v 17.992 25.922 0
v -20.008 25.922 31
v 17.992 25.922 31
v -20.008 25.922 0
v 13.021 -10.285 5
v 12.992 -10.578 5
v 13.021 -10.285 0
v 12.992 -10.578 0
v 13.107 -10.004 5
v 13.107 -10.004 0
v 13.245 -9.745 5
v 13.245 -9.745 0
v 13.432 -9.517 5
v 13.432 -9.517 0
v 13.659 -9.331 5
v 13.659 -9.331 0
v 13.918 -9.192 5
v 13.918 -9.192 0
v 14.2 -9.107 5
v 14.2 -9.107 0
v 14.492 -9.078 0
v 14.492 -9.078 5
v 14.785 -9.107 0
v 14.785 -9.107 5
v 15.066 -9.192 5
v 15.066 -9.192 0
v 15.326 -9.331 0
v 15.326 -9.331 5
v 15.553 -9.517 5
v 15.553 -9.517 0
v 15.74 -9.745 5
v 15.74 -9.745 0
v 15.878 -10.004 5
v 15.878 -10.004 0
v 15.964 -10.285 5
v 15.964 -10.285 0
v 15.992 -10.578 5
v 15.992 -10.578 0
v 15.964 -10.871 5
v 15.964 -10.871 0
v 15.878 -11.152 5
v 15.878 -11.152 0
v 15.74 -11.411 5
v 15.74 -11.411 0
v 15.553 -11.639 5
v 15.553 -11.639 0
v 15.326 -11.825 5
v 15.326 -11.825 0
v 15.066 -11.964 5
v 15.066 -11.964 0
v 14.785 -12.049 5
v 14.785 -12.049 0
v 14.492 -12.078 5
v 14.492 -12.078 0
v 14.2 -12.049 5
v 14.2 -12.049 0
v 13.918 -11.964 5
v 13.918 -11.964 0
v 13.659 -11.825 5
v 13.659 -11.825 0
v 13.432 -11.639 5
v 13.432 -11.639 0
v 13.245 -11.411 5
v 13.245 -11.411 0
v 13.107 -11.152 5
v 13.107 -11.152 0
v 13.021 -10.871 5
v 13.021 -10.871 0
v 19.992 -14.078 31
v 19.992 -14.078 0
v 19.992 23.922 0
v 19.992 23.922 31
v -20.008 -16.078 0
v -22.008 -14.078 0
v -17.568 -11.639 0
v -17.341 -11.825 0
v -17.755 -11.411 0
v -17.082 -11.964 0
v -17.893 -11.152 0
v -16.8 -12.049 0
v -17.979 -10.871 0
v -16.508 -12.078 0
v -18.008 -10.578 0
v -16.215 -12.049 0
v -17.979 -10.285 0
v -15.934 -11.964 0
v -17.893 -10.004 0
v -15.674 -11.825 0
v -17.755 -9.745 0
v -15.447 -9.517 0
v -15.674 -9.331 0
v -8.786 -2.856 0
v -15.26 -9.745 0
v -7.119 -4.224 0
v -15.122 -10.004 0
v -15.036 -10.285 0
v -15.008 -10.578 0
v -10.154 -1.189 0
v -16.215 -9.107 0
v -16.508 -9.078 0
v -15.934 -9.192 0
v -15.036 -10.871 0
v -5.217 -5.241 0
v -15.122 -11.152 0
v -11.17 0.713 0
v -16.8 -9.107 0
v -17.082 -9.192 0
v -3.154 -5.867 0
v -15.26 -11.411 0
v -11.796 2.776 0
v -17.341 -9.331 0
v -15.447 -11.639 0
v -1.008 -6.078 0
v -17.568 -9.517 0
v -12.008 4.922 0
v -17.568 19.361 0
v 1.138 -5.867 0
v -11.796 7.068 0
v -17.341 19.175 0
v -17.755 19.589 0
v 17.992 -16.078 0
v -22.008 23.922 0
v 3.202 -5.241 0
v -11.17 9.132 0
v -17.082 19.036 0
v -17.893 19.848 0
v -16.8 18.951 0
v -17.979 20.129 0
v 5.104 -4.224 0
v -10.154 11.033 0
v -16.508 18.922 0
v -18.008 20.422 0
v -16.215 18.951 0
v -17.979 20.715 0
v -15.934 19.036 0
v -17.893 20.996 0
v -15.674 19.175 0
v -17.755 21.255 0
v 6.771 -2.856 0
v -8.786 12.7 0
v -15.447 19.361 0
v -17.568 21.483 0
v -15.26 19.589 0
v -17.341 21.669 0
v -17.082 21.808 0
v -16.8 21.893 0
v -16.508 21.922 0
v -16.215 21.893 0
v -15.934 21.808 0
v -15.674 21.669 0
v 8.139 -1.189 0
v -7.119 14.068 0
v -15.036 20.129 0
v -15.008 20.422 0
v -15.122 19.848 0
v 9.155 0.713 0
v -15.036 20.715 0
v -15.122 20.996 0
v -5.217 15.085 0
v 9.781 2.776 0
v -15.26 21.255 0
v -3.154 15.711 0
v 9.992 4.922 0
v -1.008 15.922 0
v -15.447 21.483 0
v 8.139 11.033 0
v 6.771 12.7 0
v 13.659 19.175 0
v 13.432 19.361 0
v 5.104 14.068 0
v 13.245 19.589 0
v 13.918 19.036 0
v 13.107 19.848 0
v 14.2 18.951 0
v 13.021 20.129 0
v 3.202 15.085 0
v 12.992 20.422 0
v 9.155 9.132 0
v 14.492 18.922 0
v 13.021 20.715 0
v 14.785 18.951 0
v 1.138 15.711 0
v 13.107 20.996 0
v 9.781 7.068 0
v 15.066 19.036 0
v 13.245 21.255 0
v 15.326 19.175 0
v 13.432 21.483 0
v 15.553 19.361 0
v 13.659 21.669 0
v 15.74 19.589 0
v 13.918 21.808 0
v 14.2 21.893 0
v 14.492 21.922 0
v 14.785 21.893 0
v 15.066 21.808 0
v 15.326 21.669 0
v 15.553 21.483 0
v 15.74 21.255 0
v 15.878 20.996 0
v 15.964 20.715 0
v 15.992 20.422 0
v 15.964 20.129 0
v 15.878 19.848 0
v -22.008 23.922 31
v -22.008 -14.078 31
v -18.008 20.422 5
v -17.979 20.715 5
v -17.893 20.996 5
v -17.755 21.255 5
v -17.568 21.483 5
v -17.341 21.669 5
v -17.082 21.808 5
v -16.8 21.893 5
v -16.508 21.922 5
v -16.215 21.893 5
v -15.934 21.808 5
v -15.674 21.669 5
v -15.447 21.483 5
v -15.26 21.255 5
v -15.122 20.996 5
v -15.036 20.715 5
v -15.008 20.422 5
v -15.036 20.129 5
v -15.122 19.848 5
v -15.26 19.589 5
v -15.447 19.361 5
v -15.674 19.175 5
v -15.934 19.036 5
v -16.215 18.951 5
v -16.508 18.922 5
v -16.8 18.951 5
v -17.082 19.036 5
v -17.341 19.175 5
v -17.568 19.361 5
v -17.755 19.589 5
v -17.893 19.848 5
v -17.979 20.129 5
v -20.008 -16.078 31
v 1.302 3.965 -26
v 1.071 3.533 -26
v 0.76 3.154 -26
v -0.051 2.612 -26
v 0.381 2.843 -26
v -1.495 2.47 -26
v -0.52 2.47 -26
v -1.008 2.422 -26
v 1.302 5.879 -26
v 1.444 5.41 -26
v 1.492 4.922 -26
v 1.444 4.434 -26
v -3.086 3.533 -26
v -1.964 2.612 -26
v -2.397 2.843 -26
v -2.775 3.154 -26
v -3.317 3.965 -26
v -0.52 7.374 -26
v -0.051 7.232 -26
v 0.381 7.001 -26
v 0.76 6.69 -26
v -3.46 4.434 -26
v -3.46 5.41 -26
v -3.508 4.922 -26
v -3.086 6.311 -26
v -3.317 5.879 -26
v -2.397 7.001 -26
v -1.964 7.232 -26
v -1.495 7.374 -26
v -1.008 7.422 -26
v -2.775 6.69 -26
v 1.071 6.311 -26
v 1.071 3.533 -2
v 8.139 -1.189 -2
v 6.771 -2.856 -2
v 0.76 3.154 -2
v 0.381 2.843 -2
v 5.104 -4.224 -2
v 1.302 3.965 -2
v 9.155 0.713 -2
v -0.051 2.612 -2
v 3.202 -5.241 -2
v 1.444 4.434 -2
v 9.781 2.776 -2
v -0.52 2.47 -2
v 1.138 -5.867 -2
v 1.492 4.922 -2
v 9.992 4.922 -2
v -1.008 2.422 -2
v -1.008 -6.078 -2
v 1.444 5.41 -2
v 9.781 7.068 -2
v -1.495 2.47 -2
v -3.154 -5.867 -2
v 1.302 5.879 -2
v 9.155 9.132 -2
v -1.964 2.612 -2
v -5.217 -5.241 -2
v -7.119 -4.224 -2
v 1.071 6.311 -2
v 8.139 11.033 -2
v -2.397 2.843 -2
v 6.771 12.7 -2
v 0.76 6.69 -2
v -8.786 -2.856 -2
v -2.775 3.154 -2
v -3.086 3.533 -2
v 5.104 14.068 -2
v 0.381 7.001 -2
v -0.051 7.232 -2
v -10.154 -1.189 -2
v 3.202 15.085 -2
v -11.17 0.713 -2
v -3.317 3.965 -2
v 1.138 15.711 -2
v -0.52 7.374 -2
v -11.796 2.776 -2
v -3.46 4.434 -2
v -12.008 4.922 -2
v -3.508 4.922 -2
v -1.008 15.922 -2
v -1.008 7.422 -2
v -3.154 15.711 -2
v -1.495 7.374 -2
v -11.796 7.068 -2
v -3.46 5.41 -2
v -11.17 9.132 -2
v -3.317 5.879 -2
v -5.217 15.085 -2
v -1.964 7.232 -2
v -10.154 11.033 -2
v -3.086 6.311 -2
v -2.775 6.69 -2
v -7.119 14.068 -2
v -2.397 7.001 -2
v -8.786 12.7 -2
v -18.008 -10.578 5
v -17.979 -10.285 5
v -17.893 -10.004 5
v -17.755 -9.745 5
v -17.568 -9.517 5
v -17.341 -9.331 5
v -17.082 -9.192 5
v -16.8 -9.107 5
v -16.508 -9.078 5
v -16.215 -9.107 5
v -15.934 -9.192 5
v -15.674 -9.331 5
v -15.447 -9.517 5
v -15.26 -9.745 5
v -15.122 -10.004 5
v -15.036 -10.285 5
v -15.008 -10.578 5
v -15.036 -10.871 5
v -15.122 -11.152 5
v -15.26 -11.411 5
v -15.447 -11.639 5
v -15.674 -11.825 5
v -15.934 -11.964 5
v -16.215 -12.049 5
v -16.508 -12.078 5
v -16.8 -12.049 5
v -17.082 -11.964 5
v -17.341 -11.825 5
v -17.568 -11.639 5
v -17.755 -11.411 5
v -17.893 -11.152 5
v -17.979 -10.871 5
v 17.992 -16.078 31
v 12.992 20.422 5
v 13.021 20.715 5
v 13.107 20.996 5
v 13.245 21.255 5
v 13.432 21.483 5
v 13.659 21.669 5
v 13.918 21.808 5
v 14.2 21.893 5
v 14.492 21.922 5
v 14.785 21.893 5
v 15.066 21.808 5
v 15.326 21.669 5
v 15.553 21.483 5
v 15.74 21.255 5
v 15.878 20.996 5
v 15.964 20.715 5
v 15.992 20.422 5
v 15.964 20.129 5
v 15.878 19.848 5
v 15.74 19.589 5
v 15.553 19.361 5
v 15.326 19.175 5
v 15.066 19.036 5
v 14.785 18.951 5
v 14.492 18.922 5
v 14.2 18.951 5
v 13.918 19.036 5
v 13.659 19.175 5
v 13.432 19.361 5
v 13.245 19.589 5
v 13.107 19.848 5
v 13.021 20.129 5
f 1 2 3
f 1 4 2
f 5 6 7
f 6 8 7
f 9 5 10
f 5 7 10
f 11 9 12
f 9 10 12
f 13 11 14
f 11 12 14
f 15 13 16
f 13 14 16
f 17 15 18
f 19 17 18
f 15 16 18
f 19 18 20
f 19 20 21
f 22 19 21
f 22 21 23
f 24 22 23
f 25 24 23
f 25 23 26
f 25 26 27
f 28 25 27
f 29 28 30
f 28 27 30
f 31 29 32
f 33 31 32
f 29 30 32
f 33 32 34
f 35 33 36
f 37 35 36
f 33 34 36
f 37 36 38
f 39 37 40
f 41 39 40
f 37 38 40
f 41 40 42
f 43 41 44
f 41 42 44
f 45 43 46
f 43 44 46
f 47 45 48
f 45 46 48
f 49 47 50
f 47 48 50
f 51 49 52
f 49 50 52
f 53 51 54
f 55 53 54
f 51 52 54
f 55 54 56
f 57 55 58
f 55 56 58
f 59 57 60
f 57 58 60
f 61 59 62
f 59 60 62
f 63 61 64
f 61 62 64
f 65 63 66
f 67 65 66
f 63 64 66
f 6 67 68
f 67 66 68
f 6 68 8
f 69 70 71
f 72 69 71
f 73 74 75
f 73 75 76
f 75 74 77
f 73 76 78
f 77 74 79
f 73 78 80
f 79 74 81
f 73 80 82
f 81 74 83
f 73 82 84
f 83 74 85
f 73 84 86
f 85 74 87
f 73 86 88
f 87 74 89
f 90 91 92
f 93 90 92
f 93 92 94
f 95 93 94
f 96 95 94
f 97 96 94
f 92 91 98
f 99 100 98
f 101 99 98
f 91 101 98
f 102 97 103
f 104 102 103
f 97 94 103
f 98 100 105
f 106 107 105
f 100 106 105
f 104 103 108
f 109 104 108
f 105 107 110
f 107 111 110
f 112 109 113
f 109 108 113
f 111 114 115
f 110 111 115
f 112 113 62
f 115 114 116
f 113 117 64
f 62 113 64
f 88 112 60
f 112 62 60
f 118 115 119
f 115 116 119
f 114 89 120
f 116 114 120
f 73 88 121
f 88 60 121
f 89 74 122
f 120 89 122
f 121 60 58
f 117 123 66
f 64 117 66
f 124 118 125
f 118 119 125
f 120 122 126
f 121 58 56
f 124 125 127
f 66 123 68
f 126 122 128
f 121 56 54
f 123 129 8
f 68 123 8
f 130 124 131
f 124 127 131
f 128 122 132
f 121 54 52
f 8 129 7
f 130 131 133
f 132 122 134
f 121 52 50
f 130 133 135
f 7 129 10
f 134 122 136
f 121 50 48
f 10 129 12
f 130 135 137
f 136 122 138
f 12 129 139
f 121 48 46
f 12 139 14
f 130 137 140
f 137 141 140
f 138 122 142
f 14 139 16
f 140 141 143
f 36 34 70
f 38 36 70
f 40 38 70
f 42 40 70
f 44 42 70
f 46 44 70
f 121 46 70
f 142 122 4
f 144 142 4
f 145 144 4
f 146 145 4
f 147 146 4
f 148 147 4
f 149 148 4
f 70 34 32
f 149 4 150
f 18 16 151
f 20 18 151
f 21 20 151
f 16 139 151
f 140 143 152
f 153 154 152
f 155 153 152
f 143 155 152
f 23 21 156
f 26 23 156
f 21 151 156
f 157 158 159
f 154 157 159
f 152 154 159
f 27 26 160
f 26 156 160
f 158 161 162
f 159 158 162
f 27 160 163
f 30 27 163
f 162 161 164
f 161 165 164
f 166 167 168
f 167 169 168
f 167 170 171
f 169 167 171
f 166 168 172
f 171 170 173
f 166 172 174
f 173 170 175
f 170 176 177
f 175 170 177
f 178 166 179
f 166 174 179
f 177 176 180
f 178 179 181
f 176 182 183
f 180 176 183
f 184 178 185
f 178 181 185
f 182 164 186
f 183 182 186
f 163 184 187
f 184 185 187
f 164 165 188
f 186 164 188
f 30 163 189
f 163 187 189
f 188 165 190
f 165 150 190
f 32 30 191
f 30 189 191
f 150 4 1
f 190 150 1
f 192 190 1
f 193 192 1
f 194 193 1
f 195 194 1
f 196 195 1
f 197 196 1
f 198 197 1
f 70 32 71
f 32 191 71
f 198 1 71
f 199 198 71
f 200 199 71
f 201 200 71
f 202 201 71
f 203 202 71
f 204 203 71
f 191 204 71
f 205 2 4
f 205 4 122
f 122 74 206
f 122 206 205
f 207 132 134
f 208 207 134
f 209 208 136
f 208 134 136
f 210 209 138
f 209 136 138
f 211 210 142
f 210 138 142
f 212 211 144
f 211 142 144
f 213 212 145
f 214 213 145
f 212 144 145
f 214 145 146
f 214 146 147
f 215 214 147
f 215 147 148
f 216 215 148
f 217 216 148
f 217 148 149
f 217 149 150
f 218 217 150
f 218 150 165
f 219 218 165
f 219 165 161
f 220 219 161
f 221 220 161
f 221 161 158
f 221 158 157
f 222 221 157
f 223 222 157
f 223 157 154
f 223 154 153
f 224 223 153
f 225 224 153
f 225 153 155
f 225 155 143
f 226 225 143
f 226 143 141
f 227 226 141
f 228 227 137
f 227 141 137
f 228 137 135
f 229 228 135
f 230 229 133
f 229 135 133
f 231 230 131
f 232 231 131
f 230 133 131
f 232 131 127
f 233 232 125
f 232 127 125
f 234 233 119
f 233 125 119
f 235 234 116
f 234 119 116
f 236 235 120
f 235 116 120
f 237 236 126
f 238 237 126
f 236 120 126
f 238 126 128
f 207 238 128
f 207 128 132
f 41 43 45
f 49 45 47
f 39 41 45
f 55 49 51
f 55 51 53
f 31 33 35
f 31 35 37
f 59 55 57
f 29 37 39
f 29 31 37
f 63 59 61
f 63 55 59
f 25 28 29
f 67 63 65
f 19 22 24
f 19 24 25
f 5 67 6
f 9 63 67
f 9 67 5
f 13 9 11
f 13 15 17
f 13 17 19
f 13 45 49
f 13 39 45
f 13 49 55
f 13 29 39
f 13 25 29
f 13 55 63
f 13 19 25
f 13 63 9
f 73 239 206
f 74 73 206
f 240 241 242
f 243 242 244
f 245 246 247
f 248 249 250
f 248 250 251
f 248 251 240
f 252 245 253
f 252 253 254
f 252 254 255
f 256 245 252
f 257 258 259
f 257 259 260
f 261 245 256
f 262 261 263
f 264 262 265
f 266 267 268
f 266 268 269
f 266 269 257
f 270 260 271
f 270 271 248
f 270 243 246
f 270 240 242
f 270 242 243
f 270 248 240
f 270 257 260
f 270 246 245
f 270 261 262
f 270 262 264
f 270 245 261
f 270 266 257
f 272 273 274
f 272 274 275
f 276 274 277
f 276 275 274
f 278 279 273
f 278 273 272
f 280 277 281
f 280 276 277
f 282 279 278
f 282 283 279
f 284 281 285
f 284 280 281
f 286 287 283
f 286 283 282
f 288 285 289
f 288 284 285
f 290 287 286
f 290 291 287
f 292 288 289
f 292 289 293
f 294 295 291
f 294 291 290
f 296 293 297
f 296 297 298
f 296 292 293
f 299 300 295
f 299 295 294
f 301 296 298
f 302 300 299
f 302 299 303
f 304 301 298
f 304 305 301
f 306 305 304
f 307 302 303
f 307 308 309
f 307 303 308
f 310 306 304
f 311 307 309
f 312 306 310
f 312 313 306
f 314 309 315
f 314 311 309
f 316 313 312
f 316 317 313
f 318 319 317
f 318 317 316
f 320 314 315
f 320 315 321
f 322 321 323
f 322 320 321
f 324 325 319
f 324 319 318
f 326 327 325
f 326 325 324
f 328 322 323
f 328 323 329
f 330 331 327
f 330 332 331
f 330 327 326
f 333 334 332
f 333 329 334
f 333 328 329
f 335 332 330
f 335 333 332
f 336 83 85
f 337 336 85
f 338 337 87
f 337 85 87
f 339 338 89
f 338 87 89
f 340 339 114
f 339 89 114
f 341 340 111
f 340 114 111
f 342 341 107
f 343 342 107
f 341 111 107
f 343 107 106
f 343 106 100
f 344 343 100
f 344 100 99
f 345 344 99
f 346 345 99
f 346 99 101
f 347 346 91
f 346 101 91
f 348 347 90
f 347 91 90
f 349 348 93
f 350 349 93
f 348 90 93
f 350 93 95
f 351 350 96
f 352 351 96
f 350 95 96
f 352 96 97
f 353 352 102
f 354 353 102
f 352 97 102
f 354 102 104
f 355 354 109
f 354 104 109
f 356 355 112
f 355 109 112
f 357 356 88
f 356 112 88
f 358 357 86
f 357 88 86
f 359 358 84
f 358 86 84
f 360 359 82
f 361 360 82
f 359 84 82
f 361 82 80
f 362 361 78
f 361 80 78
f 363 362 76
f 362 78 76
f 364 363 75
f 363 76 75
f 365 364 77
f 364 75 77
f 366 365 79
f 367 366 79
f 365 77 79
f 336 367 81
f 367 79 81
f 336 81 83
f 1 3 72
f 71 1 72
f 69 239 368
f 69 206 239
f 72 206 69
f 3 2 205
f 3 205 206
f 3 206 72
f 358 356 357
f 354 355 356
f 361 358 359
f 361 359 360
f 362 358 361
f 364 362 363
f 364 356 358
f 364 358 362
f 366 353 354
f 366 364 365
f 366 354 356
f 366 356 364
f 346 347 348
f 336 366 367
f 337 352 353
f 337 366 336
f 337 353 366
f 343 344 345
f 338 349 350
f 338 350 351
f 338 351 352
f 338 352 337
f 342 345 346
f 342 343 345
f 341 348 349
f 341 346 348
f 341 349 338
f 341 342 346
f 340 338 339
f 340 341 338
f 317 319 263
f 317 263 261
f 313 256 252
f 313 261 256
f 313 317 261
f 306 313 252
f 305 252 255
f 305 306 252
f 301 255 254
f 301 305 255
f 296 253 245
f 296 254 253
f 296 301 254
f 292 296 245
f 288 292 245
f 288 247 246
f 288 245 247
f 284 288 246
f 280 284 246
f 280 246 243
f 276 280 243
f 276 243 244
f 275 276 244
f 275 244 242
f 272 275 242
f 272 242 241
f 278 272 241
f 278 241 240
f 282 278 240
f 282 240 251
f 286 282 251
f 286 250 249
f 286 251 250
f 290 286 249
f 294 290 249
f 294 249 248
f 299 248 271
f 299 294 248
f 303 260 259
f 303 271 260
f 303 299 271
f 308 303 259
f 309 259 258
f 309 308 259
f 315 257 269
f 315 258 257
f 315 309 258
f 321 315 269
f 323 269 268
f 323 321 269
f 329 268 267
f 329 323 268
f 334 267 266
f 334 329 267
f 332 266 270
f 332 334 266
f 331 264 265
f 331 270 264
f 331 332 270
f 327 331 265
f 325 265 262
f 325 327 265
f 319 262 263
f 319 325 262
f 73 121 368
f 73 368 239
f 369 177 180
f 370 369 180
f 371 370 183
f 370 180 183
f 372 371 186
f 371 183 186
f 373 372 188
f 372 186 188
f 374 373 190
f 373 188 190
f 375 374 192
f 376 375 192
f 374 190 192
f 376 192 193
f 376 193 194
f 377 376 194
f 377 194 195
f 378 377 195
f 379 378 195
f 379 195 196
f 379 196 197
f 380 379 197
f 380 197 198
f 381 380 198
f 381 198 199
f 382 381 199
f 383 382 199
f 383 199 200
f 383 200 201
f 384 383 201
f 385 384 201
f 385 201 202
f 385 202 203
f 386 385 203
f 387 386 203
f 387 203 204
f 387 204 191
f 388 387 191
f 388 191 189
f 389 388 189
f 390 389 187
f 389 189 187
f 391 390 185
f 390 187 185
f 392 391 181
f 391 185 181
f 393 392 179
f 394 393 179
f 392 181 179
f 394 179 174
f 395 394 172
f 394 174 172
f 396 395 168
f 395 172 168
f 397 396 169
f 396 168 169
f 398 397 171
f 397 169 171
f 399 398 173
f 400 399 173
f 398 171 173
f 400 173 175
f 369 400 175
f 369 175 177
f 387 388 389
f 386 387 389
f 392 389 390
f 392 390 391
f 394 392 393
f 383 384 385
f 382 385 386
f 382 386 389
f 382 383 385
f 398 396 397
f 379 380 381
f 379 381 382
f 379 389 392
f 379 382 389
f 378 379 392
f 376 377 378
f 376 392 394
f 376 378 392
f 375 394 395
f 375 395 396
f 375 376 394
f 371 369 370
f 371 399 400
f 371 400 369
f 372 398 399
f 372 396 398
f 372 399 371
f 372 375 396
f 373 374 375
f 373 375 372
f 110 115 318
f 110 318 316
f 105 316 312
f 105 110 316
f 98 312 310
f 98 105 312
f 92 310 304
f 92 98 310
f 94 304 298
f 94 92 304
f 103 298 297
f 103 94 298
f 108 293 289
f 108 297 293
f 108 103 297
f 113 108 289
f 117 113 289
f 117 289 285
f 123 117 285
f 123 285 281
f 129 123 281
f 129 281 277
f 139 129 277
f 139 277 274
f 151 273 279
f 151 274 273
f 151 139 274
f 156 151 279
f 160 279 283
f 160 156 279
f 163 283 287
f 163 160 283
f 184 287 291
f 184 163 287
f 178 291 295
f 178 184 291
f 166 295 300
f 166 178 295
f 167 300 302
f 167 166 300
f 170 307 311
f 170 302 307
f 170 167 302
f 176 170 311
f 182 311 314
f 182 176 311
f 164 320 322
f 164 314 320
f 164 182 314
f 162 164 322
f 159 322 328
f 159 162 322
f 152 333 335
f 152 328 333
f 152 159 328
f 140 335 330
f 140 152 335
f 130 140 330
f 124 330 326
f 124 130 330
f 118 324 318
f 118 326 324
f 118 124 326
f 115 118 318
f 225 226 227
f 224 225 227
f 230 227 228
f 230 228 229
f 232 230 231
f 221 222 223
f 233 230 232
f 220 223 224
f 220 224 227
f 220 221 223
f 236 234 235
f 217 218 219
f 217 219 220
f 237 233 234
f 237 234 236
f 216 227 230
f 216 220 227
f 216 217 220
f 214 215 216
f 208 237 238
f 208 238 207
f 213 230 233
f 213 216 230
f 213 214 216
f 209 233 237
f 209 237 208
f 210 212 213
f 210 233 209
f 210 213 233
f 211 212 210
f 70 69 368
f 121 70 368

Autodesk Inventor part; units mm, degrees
ref_plane "YZ Plane" through (0, 0, 0) normal (1, 0, 0) x (0, 1, 0)
ref_plane "XZ Plane" through (0, 0, 0) normal (0, 1, 0) x (-1, 0, 0)
ref_plane "XY Plane" through (0, 0, 0) normal (0, 0, 1) x (1, 0, 0)
sketch "Sketch1" plane through (0, 0, 0) normal (0, 0, 1) x (1, 0, 0)
  line L0 (19.9924, -21.8579) -> (16.7724, -25.0779) projected
  line L1 (19.9924, -21.8579) -> (19.9924, 20.4221) projected
  arc A0 (19.9924, 20.4221) -> (14.4924, 25.9221) centre (14.4924, 20.4221) ccw construction
  line L2 (14.4924, 25.9221) -> (14.2174, 25.9221) projected
  line L3 (14.2174, 25.9221) -> (14.2174, 26.4221) projected
  line L4 (9.7174, 30.9221) -> (14.2174, 26.4221) projected
  line L5 (-3.2826, 30.9221) -> (3.2174, 30.9221) projected
  line L6 (-7.7826, 26.4221) -> (-3.2826, 30.9221) projected
  line L7 (-7.7826, 25.9221) -> (-7.7826, 26.4221) projected
  line L8 (-7.7826, 25.9221) -> (-16.5076, 25.9221) projected
  arc A1 (-16.5076, 25.9221) -> (-22.0076, 20.4221) centre (-16.5076, 20.4221) ccw construction
  line L9 (-22.0076, 20.4221) -> (-22.0076, -10.5779) projected
  arc A2 (-22.0076, -10.5779) -> (-16.5076, -16.0779) centre (-16.5076, -10.5779) ccw construction
  line L10 (-16.5076, -16.0779) -> (-13.0076, -16.0779) projected
  line L11 (-13.0076, -16.0779) -> (-13.0076, -21.8579) projected
  line L12 (-9.7876, -25.0779) -> (-13.0076, -21.8579) projected
  line L13 (-9.7876, -25.0779) -> (-9.7826, -25.0779) projected
  line L14 (-12.7826, -28.0779) -> (-9.7826, -25.0779) projected
  line L15 (-15.5326, -28.0779) -> (-12.7826, -28.0779) projected
  line L16 (-15.5326, -28.0779) -> (-15.5326, -66.0779) projected
  arc A3 (-15.5326, -66.0779) -> (-9.5326, -72.0779) centre (-9.5326, -66.0779) ccw projected
  line L17 (-9.5326, -72.0779) -> (15.9674, -72.0779) projected
  arc A4 (15.9674, -72.0779) -> (21.9674, -66.0779) centre (15.9674, -66.0779) ccw projected
  line L18 (21.9674, -28.0779) -> (21.9674, -66.0779) projected
  line L19 (19.2174, -28.0779) -> (21.9674, -28.0779) projected
  line L20 (19.2174, -28.0779) -> (16.2174, -25.0779) projected
  line L21 (16.2174, -25.0779) -> (16.7724, -25.0779) projected
  circle A5 centre (-16.5076, 20.4221) radius 1.7 construction
  circle A6 centre (14.4924, 20.4221) radius 1.7 construction
  circle A7 centre (14.4924, -10.5779) radius 1.7 construction
  circle A8 centre (-16.5076, -10.5779) radius 1.7 construction
  circle A9 centre (14.7174, -41.5779) radius 2.25 projected
  circle A10 centre (-8.2826, -41.5779) radius 2.25 projected
  circle A11 centre (14.7174, -64.5779) radius 2.25 projected
  circle A12 centre (-8.2826, -64.5779) radius 2.25 projected
  circle A13 centre (-1.0076, 4.9221) radius 12.5 construction
  line L22 (-20.0076, 25.9221) -> (17.9924, 25.9221)
  line L23 (19.9924, 23.9221) -> (19.9924, -14.0779)
  line L24 (17.9924, -16.0779) -> (-20.0076, -16.0779)
  line L25 (-22.0076, -14.0779) -> (-22.0076, 23.9221)
  line L26 (-22.0076, 25.9221) -> (19.9924, -16.0779) construction
  line L27 (19.9924, 25.9221) -> (-22.0076, -16.0779) construction
  line L28 (-20.0076, 25.9221) -> (-22.0076, 23.9221)
  line L29 (17.9924, 25.9221) -> (19.9924, 23.9221)
  line L30 (19.9924, -14.0779) -> (17.9924, -16.0779)
  line L31 (-20.0076, -16.0779) -> (-22.0076, -14.0779)
  line L32 (7.7174, 40.9221) -> (8.8956, 39.0987) projected
  line L33 (5.2174, 40.9221) -> (7.7174, 40.9221) projected
  line L34 (3.2174, 38.9221) -> (5.2174, 40.9221) projected
  line L35 (3.2174, 30.9221) -> (3.2174, 38.9221) projected
  arc A14 (8.8956, 39.0987) -> (9.7174, 30.9221) centre (18.3776, 35.9221) ccw projected
  point P0 (0, 0)
  dimension "d0" = 2
  dimension "d1" = 2
  dimension "d2" = 2
  dimension "d3" = 2
  dimension "d4" = 2
  dimension "d5" = 2
  dimension "d6" = 2
  dimension "d7" = 2
extrude "Extrusion1" add sketch "Sketch1" along normal blind 31 contours L30 L24 L10 L31 L25 L9 L28 L22 L8 L2 L29 L23 L1
sketch "Sketch2" plane through (0, 0, 0) normal (0, 0, -1) x (-1, 0, 0)
  circle A0 centre (1.0076, 4.9221) radius 12.5 projected
  circle A1 centre (1.0076, 4.9221) radius 11
  point P0 (0, 0)
  dimension "d10" = 22
extrude "Extrusion2" add sketch "Sketch2" along normal blind 2 contours A1
sketch "Sketch3" plane through (0, 0, 0) normal (0, 0, -1) x (-1, 0, 0)
  line L0 (20.0076, 25.9221) -> (22.0076, 23.9221) projected
  line L1 (-19.9924, 23.9221) -> (-17.9924, 25.9221) projected
  line L2 (-17.9924, -16.0779) -> (-19.9924, -14.0779) projected
  line L3 (22.0076, -14.0779) -> (20.0076, -16.0779) projected
  circle A0 centre (-14.4924, 20.4221) radius 1.5
  circle A1 centre (16.5076, 20.4221) radius 1.5
  line L4 (-18.9924, 24.9221) -> (21.0076, -15.0779) construction
  line L5 (21.0076, 24.9221) -> (-18.9924, -15.0779) construction
  circle A2 centre (-14.4924, -10.5779) radius 1.5
  circle A3 centre (16.5076, -10.5779) radius 1.5
  point P0 (0, 0)
  dimension "d13" = 31
  dimension "d14" = 3
extrude "Extrusion3" cut sketch "Sketch3" against normal blind 5
sketch "Sketch4" plane through (-1.0076, 4.9221, -2) normal (0, 0, -1) x (-1, 0, 0)
  circle A0 centre (0, 0) radius 11 projected
  circle A1 centre (0, 0) radius 2.5
  point P0 (-1.0076, -4.9221)
  dimension "d17" = 5
extrude "Extrusion4" add sketch "Sketch4" along normal blind 24 contours A1
equation "\"d1\" = d0"
equation "\"d2\" = d0"
equation "\"d3\" = d2"
equation "\"d4\" = d0"
equation "\"d5\" = d4"
equation "\"d6\" = d0"
equation "\"d7\" = d6"
properties part number "NEMA17"
